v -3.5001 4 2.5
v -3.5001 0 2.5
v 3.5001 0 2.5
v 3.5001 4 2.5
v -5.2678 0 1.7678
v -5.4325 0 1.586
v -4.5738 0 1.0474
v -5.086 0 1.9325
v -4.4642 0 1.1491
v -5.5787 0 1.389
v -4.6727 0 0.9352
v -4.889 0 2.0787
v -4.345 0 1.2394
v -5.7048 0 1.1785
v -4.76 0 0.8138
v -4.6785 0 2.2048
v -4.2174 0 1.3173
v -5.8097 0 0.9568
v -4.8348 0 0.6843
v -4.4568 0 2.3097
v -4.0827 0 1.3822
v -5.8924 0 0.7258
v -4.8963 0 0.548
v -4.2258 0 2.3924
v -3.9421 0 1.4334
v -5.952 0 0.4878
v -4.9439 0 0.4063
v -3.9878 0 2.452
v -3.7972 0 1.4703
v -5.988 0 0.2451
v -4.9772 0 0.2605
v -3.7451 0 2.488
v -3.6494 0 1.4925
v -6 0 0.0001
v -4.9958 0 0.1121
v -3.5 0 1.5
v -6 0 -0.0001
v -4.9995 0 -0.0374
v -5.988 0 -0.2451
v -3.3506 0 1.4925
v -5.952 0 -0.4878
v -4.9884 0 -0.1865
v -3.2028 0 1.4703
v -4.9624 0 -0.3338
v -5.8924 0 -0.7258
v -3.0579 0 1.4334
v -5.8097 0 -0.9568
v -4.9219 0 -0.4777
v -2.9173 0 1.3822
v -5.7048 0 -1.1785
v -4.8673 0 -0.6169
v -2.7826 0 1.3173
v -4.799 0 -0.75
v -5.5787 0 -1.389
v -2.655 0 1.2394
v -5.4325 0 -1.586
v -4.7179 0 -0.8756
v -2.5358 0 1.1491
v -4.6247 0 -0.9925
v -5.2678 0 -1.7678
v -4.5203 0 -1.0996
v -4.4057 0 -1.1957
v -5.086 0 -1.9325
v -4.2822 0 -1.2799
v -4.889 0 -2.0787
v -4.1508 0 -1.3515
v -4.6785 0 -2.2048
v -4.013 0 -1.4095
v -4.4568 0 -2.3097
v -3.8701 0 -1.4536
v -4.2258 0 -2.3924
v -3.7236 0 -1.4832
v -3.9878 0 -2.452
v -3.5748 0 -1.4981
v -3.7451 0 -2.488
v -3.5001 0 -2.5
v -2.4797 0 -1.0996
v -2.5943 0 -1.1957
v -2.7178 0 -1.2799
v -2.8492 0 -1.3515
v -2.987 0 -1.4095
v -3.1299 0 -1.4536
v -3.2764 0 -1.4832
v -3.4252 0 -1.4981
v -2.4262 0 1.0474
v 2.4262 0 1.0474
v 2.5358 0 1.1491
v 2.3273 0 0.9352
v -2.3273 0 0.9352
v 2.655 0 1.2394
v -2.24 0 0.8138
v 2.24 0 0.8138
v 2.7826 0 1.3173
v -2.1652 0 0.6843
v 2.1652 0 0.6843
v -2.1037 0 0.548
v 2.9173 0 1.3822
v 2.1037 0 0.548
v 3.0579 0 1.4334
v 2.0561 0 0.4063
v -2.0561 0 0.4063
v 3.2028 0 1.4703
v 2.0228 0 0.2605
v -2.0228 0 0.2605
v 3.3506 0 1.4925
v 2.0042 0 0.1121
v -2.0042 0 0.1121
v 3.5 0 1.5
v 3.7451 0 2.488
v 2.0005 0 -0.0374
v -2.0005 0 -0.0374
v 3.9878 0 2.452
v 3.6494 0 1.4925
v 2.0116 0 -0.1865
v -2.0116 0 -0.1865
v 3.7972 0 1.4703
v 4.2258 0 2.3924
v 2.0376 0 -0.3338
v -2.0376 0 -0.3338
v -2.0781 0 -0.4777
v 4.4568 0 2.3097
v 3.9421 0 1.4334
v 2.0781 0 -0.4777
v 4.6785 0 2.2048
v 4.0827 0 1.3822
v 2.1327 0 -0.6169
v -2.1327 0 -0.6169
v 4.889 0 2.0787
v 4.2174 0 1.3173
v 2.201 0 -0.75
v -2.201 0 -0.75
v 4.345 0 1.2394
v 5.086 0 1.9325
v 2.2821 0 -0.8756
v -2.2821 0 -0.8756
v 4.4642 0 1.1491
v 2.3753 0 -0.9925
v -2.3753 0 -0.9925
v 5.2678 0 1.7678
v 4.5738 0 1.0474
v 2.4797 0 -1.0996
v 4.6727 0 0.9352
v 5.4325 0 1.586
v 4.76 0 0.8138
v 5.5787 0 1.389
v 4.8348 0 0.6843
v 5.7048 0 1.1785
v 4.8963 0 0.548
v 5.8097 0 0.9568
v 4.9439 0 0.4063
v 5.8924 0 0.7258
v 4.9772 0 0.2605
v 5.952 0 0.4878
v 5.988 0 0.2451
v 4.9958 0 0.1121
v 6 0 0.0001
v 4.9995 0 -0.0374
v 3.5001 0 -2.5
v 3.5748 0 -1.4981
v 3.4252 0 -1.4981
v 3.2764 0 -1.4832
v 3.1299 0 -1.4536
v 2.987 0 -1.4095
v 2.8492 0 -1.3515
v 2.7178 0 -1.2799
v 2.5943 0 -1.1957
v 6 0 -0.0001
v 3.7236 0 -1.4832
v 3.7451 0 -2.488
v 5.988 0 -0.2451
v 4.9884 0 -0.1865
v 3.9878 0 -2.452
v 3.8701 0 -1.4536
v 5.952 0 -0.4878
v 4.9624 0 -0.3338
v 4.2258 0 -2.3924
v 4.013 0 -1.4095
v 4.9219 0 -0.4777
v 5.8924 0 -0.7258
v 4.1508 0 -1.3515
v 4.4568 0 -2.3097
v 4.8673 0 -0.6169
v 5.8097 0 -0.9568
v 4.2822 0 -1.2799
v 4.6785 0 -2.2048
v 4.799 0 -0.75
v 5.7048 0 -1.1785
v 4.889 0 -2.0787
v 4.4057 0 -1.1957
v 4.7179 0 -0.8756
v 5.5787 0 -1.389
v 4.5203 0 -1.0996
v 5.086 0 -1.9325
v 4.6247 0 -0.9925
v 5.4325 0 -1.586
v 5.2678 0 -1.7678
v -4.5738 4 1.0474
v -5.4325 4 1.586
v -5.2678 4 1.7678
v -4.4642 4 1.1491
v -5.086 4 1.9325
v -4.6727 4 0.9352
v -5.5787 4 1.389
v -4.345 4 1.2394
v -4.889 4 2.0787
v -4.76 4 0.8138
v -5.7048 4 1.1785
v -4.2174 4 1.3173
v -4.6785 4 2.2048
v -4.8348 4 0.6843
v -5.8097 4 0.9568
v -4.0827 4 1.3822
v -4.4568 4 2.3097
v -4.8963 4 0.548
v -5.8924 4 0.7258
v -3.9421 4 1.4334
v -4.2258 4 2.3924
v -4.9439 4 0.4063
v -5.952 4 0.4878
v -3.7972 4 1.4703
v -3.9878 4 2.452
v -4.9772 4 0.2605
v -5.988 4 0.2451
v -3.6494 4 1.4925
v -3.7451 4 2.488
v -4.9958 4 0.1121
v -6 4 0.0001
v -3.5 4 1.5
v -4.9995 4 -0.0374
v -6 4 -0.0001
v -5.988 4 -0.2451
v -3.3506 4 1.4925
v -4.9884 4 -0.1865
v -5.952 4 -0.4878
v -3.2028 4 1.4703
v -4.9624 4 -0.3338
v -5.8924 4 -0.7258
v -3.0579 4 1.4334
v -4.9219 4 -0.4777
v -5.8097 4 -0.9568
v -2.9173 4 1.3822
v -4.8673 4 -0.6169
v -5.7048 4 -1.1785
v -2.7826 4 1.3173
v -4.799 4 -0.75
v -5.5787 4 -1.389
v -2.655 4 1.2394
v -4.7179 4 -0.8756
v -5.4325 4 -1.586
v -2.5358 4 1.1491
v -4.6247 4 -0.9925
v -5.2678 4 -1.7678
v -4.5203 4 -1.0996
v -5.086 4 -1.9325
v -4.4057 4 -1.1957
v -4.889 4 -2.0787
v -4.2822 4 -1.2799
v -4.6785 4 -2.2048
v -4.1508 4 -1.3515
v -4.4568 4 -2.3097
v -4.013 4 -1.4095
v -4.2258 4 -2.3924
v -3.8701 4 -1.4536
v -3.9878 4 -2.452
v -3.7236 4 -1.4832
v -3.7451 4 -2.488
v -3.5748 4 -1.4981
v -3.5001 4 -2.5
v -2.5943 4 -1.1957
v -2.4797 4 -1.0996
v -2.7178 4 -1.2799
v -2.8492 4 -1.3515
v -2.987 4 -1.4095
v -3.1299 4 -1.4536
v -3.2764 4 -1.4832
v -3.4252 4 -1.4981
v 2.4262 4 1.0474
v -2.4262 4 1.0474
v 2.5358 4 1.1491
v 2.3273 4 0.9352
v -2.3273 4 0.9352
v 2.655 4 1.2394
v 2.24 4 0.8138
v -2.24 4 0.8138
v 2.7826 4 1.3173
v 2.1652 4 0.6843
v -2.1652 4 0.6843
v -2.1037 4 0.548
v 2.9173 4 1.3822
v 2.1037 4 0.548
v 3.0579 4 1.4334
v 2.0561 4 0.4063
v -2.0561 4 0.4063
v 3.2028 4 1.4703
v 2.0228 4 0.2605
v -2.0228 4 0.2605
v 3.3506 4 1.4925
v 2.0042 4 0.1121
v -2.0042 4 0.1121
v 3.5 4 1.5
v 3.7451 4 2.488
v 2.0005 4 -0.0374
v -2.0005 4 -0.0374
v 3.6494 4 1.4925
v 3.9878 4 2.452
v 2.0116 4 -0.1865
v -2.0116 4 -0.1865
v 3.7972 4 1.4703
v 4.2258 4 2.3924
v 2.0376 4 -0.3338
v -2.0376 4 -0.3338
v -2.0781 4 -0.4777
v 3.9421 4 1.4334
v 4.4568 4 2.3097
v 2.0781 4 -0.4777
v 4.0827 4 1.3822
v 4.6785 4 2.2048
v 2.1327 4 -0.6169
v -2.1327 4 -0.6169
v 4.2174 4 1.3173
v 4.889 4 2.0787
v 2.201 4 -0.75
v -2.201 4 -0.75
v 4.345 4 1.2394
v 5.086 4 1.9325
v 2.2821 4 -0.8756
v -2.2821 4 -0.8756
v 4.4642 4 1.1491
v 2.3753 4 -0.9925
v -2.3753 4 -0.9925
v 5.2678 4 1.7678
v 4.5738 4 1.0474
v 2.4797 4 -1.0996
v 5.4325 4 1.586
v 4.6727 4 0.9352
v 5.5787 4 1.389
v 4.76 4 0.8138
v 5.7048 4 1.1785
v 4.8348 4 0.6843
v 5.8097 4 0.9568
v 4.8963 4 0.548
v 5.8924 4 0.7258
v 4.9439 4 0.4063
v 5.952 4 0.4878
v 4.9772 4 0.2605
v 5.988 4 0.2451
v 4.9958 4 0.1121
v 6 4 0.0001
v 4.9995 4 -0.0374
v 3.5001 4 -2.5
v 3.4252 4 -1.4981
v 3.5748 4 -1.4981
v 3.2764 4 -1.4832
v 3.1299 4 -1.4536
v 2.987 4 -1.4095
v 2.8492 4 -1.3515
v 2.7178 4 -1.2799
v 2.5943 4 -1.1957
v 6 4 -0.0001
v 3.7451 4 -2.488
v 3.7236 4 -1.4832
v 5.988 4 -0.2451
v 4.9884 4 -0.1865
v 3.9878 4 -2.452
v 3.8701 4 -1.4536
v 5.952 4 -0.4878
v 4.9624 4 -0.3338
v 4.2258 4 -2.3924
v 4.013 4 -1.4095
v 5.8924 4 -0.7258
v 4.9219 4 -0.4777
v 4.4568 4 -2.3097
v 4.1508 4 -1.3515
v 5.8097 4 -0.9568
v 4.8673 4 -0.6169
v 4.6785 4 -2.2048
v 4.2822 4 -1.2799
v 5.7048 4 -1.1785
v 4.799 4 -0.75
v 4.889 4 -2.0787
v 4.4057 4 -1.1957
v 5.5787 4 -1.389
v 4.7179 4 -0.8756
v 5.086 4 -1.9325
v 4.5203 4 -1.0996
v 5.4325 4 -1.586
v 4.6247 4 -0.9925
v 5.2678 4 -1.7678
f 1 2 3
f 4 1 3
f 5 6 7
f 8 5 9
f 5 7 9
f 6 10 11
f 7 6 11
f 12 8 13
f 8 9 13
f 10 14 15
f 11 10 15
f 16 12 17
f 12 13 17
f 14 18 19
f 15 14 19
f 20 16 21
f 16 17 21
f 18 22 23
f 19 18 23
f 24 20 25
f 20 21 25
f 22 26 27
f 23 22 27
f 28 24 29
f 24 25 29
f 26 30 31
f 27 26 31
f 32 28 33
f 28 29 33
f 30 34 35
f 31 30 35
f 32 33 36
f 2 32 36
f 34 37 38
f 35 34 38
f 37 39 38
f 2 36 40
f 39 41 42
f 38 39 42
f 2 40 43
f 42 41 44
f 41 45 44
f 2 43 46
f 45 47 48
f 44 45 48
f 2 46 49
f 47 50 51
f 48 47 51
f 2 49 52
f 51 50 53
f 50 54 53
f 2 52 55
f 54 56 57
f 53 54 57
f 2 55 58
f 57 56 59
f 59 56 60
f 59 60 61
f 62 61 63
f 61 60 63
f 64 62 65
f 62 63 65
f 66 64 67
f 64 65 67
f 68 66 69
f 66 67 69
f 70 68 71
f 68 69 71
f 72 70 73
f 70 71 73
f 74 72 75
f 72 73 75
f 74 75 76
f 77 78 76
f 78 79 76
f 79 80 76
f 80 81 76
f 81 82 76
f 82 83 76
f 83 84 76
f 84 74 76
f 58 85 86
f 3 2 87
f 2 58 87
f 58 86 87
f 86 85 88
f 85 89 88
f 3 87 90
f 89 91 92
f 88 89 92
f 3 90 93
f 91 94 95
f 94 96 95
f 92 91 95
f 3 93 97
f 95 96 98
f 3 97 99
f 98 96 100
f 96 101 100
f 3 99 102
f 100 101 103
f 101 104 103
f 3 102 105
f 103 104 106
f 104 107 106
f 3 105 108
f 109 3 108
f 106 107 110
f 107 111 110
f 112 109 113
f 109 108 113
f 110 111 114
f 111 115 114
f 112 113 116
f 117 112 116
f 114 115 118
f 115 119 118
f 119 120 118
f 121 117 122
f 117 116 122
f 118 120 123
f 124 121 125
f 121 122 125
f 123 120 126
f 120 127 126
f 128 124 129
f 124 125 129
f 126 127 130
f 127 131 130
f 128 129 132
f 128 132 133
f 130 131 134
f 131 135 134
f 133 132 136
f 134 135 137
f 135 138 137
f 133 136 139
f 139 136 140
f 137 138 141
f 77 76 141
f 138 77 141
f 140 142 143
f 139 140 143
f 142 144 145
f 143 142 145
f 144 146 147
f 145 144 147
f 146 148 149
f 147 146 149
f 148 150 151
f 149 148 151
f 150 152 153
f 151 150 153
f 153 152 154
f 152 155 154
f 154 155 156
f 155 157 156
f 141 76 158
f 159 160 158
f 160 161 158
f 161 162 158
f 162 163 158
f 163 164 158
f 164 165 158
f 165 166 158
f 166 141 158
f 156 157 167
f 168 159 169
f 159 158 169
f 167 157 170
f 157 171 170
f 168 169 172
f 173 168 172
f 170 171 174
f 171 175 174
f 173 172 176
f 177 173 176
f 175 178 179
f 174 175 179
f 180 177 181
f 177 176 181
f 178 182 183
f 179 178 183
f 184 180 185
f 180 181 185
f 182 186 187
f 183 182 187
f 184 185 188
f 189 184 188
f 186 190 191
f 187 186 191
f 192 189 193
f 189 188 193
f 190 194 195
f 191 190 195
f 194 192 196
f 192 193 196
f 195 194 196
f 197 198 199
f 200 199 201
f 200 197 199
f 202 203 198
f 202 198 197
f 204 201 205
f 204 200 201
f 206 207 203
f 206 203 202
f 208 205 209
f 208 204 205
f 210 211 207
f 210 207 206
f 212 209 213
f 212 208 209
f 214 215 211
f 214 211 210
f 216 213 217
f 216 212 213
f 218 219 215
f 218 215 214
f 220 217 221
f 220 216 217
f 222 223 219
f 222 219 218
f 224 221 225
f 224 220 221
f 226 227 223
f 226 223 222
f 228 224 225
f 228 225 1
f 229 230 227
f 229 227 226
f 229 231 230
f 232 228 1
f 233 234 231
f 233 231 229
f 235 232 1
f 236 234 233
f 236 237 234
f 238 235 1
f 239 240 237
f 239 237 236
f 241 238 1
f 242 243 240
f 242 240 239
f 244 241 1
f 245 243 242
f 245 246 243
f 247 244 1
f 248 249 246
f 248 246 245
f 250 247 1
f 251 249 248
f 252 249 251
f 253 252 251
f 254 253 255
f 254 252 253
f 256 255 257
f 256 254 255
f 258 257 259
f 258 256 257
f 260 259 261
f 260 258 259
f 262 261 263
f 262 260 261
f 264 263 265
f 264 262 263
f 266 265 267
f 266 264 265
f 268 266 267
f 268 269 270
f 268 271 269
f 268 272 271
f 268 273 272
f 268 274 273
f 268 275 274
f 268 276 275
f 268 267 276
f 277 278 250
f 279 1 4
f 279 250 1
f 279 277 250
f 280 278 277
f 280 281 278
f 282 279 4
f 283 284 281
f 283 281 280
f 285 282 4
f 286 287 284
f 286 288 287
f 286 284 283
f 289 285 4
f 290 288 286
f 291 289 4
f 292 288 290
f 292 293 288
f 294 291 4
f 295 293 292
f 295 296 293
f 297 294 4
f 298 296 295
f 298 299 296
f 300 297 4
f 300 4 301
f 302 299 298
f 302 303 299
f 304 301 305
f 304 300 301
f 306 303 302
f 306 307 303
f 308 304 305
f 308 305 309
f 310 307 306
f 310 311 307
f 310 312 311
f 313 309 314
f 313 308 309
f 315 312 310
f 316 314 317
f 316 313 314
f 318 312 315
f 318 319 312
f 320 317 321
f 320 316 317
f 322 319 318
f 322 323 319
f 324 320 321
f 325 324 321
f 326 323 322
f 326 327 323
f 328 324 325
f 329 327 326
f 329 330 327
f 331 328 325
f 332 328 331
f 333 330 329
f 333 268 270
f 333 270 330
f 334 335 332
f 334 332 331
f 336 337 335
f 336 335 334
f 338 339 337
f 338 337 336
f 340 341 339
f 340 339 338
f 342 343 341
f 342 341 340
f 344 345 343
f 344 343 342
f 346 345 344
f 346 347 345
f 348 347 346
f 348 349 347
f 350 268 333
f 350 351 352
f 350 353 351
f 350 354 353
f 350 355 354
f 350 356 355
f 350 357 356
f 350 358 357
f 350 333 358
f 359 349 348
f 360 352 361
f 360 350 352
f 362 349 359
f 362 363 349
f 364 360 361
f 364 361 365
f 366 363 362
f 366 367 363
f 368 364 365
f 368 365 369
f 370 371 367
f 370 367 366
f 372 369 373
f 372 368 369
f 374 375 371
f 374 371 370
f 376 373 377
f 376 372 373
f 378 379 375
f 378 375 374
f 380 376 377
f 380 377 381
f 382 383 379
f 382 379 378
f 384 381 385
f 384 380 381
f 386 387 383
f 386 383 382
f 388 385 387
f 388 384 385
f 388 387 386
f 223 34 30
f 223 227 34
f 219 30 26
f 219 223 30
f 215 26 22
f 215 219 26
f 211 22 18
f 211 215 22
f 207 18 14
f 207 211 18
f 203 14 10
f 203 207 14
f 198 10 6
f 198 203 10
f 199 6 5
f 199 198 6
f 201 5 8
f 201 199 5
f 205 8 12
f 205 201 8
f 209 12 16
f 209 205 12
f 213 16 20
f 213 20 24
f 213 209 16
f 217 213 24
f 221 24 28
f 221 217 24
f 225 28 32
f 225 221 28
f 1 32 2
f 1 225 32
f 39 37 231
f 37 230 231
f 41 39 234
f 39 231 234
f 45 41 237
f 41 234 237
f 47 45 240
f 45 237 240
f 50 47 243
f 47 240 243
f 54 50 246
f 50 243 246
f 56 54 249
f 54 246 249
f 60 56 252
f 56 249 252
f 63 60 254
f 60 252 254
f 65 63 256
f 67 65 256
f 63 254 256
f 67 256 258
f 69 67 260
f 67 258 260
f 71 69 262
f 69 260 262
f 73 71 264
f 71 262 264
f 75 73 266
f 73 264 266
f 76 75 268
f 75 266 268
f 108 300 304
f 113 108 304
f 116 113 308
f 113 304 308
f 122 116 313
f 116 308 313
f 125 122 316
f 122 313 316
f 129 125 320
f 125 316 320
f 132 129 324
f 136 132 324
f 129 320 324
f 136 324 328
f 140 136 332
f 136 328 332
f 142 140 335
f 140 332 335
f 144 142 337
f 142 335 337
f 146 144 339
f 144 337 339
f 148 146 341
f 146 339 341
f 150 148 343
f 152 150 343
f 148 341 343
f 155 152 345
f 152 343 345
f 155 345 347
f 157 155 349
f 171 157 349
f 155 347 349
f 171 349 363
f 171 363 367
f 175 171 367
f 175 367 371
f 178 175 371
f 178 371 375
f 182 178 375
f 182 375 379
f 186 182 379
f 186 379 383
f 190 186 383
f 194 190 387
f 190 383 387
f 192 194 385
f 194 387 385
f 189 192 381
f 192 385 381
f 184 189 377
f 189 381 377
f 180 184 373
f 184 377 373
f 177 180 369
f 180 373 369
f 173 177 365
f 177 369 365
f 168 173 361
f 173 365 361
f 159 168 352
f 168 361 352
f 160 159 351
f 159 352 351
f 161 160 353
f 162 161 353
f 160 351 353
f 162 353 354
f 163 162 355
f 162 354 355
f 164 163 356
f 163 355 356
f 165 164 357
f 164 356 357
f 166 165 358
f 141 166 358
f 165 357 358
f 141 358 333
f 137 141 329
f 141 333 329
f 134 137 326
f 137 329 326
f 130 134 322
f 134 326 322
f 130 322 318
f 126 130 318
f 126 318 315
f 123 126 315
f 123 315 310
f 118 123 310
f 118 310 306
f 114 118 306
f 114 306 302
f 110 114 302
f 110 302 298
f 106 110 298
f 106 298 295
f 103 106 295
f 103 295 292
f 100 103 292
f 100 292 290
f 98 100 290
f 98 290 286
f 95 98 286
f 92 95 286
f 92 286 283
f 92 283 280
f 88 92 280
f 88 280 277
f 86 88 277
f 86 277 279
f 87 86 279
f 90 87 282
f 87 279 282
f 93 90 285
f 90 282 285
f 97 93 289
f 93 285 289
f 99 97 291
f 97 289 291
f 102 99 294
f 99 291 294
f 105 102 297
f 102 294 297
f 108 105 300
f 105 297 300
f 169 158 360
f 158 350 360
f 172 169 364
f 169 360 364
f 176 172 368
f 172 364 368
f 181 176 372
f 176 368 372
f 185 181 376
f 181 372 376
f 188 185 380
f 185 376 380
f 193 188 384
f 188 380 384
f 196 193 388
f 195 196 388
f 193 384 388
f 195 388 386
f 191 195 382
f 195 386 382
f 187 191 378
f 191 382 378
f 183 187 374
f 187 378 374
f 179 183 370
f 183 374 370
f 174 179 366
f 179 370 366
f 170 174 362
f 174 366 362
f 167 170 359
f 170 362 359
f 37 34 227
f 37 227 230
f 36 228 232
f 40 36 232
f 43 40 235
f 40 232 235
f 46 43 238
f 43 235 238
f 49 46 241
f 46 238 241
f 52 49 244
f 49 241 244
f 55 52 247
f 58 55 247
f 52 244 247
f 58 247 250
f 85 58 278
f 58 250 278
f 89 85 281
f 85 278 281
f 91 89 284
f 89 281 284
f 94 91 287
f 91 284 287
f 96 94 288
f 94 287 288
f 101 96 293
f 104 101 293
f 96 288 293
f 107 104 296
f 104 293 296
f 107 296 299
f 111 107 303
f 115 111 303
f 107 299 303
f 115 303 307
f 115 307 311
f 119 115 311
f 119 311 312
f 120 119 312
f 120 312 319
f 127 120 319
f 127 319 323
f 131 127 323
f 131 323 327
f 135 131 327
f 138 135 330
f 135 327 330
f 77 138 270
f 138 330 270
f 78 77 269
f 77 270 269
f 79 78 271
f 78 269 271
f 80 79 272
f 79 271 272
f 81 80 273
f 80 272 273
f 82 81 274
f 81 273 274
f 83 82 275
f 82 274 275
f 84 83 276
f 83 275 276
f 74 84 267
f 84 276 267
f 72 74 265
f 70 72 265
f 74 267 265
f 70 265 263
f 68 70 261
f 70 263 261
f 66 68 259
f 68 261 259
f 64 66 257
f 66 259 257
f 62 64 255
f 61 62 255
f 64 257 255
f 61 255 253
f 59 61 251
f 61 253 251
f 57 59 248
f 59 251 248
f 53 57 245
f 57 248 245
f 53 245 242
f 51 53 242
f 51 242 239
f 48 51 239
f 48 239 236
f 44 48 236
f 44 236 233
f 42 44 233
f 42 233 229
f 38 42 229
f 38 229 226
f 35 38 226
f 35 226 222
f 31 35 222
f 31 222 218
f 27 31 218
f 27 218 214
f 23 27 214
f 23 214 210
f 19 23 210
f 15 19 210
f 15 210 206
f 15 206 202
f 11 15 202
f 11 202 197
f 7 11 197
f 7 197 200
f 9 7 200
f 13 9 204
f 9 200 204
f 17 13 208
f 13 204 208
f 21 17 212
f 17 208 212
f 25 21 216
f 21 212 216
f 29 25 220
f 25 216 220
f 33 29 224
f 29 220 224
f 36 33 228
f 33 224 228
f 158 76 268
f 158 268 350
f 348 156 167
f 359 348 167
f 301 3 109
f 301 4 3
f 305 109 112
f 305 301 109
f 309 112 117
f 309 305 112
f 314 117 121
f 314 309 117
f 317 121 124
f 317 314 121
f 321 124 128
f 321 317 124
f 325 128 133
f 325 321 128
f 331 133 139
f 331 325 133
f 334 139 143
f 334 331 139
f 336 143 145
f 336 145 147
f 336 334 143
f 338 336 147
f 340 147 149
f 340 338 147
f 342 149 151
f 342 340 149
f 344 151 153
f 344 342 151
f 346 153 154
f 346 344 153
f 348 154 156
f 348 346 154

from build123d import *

# Parameters (mm, degrees)
SKETCH1_W           = 12
SKETCH1_H           = 5
BOSS_EXTRUDE1_DEPTH = 4
SKETCH2_R           = 1.5
CUT_EXTRUDE1_DEPTH  = 4
SKETCH3_R           = 1.5
CUT_EXTRUDE2_DEPTH  = 4
FILLET1_R           = 2.5


with BuildPart() as part:
    # Sketch1 → Boss-Extrude1 (new body)
    with BuildSketch(Plane(origin=(0, 0, 0), x_dir=(1, 0, 0), z_dir=(0, 1, 0))):
        Rectangle(SKETCH1_W, SKETCH1_H)
    extrude(amount=BOSS_EXTRUDE1_DEPTH)

    # Sketch2 → Cut-Extrude1 (cut)
    with BuildSketch(Plane(origin=(0, 4, 0), x_dir=(1, 0, 0), z_dir=(0, 1, 0))):
        with Locations(Location((3.5, 0, 0), (0, 0, 270))):
            Circle(SKETCH2_R)
    extrude(amount=-CUT_EXTRUDE1_DEPTH, mode=Mode.SUBTRACT)

    # Sketch3 → Cut-Extrude2 (cut)
    with BuildSketch(Plane(origin=(0, 4, 0), x_dir=(1, 0, 0), z_dir=(0, 1, 0))):
        with Locations(Location((-3.5, 0, 0), (0, 0, 270))):
            Circle(SKETCH3_R)
    extrude(amount=-CUT_EXTRUDE2_DEPTH, mode=Mode.SUBTRACT)

    # Fillet1
    fillet1_edges = [part.edges().sort_by_distance(p)[0] for p in [
        (6, 2, 2.5),
        (6, 2, -2.5),
        (-6, 2, 2.5),
        (-6, 2, -2.5),
    ]]
    fillet(fillet1_edges, radius=FILLET1_R - 0.0001)  # a hair under: the kernel refuses the full size


solid = part.part
